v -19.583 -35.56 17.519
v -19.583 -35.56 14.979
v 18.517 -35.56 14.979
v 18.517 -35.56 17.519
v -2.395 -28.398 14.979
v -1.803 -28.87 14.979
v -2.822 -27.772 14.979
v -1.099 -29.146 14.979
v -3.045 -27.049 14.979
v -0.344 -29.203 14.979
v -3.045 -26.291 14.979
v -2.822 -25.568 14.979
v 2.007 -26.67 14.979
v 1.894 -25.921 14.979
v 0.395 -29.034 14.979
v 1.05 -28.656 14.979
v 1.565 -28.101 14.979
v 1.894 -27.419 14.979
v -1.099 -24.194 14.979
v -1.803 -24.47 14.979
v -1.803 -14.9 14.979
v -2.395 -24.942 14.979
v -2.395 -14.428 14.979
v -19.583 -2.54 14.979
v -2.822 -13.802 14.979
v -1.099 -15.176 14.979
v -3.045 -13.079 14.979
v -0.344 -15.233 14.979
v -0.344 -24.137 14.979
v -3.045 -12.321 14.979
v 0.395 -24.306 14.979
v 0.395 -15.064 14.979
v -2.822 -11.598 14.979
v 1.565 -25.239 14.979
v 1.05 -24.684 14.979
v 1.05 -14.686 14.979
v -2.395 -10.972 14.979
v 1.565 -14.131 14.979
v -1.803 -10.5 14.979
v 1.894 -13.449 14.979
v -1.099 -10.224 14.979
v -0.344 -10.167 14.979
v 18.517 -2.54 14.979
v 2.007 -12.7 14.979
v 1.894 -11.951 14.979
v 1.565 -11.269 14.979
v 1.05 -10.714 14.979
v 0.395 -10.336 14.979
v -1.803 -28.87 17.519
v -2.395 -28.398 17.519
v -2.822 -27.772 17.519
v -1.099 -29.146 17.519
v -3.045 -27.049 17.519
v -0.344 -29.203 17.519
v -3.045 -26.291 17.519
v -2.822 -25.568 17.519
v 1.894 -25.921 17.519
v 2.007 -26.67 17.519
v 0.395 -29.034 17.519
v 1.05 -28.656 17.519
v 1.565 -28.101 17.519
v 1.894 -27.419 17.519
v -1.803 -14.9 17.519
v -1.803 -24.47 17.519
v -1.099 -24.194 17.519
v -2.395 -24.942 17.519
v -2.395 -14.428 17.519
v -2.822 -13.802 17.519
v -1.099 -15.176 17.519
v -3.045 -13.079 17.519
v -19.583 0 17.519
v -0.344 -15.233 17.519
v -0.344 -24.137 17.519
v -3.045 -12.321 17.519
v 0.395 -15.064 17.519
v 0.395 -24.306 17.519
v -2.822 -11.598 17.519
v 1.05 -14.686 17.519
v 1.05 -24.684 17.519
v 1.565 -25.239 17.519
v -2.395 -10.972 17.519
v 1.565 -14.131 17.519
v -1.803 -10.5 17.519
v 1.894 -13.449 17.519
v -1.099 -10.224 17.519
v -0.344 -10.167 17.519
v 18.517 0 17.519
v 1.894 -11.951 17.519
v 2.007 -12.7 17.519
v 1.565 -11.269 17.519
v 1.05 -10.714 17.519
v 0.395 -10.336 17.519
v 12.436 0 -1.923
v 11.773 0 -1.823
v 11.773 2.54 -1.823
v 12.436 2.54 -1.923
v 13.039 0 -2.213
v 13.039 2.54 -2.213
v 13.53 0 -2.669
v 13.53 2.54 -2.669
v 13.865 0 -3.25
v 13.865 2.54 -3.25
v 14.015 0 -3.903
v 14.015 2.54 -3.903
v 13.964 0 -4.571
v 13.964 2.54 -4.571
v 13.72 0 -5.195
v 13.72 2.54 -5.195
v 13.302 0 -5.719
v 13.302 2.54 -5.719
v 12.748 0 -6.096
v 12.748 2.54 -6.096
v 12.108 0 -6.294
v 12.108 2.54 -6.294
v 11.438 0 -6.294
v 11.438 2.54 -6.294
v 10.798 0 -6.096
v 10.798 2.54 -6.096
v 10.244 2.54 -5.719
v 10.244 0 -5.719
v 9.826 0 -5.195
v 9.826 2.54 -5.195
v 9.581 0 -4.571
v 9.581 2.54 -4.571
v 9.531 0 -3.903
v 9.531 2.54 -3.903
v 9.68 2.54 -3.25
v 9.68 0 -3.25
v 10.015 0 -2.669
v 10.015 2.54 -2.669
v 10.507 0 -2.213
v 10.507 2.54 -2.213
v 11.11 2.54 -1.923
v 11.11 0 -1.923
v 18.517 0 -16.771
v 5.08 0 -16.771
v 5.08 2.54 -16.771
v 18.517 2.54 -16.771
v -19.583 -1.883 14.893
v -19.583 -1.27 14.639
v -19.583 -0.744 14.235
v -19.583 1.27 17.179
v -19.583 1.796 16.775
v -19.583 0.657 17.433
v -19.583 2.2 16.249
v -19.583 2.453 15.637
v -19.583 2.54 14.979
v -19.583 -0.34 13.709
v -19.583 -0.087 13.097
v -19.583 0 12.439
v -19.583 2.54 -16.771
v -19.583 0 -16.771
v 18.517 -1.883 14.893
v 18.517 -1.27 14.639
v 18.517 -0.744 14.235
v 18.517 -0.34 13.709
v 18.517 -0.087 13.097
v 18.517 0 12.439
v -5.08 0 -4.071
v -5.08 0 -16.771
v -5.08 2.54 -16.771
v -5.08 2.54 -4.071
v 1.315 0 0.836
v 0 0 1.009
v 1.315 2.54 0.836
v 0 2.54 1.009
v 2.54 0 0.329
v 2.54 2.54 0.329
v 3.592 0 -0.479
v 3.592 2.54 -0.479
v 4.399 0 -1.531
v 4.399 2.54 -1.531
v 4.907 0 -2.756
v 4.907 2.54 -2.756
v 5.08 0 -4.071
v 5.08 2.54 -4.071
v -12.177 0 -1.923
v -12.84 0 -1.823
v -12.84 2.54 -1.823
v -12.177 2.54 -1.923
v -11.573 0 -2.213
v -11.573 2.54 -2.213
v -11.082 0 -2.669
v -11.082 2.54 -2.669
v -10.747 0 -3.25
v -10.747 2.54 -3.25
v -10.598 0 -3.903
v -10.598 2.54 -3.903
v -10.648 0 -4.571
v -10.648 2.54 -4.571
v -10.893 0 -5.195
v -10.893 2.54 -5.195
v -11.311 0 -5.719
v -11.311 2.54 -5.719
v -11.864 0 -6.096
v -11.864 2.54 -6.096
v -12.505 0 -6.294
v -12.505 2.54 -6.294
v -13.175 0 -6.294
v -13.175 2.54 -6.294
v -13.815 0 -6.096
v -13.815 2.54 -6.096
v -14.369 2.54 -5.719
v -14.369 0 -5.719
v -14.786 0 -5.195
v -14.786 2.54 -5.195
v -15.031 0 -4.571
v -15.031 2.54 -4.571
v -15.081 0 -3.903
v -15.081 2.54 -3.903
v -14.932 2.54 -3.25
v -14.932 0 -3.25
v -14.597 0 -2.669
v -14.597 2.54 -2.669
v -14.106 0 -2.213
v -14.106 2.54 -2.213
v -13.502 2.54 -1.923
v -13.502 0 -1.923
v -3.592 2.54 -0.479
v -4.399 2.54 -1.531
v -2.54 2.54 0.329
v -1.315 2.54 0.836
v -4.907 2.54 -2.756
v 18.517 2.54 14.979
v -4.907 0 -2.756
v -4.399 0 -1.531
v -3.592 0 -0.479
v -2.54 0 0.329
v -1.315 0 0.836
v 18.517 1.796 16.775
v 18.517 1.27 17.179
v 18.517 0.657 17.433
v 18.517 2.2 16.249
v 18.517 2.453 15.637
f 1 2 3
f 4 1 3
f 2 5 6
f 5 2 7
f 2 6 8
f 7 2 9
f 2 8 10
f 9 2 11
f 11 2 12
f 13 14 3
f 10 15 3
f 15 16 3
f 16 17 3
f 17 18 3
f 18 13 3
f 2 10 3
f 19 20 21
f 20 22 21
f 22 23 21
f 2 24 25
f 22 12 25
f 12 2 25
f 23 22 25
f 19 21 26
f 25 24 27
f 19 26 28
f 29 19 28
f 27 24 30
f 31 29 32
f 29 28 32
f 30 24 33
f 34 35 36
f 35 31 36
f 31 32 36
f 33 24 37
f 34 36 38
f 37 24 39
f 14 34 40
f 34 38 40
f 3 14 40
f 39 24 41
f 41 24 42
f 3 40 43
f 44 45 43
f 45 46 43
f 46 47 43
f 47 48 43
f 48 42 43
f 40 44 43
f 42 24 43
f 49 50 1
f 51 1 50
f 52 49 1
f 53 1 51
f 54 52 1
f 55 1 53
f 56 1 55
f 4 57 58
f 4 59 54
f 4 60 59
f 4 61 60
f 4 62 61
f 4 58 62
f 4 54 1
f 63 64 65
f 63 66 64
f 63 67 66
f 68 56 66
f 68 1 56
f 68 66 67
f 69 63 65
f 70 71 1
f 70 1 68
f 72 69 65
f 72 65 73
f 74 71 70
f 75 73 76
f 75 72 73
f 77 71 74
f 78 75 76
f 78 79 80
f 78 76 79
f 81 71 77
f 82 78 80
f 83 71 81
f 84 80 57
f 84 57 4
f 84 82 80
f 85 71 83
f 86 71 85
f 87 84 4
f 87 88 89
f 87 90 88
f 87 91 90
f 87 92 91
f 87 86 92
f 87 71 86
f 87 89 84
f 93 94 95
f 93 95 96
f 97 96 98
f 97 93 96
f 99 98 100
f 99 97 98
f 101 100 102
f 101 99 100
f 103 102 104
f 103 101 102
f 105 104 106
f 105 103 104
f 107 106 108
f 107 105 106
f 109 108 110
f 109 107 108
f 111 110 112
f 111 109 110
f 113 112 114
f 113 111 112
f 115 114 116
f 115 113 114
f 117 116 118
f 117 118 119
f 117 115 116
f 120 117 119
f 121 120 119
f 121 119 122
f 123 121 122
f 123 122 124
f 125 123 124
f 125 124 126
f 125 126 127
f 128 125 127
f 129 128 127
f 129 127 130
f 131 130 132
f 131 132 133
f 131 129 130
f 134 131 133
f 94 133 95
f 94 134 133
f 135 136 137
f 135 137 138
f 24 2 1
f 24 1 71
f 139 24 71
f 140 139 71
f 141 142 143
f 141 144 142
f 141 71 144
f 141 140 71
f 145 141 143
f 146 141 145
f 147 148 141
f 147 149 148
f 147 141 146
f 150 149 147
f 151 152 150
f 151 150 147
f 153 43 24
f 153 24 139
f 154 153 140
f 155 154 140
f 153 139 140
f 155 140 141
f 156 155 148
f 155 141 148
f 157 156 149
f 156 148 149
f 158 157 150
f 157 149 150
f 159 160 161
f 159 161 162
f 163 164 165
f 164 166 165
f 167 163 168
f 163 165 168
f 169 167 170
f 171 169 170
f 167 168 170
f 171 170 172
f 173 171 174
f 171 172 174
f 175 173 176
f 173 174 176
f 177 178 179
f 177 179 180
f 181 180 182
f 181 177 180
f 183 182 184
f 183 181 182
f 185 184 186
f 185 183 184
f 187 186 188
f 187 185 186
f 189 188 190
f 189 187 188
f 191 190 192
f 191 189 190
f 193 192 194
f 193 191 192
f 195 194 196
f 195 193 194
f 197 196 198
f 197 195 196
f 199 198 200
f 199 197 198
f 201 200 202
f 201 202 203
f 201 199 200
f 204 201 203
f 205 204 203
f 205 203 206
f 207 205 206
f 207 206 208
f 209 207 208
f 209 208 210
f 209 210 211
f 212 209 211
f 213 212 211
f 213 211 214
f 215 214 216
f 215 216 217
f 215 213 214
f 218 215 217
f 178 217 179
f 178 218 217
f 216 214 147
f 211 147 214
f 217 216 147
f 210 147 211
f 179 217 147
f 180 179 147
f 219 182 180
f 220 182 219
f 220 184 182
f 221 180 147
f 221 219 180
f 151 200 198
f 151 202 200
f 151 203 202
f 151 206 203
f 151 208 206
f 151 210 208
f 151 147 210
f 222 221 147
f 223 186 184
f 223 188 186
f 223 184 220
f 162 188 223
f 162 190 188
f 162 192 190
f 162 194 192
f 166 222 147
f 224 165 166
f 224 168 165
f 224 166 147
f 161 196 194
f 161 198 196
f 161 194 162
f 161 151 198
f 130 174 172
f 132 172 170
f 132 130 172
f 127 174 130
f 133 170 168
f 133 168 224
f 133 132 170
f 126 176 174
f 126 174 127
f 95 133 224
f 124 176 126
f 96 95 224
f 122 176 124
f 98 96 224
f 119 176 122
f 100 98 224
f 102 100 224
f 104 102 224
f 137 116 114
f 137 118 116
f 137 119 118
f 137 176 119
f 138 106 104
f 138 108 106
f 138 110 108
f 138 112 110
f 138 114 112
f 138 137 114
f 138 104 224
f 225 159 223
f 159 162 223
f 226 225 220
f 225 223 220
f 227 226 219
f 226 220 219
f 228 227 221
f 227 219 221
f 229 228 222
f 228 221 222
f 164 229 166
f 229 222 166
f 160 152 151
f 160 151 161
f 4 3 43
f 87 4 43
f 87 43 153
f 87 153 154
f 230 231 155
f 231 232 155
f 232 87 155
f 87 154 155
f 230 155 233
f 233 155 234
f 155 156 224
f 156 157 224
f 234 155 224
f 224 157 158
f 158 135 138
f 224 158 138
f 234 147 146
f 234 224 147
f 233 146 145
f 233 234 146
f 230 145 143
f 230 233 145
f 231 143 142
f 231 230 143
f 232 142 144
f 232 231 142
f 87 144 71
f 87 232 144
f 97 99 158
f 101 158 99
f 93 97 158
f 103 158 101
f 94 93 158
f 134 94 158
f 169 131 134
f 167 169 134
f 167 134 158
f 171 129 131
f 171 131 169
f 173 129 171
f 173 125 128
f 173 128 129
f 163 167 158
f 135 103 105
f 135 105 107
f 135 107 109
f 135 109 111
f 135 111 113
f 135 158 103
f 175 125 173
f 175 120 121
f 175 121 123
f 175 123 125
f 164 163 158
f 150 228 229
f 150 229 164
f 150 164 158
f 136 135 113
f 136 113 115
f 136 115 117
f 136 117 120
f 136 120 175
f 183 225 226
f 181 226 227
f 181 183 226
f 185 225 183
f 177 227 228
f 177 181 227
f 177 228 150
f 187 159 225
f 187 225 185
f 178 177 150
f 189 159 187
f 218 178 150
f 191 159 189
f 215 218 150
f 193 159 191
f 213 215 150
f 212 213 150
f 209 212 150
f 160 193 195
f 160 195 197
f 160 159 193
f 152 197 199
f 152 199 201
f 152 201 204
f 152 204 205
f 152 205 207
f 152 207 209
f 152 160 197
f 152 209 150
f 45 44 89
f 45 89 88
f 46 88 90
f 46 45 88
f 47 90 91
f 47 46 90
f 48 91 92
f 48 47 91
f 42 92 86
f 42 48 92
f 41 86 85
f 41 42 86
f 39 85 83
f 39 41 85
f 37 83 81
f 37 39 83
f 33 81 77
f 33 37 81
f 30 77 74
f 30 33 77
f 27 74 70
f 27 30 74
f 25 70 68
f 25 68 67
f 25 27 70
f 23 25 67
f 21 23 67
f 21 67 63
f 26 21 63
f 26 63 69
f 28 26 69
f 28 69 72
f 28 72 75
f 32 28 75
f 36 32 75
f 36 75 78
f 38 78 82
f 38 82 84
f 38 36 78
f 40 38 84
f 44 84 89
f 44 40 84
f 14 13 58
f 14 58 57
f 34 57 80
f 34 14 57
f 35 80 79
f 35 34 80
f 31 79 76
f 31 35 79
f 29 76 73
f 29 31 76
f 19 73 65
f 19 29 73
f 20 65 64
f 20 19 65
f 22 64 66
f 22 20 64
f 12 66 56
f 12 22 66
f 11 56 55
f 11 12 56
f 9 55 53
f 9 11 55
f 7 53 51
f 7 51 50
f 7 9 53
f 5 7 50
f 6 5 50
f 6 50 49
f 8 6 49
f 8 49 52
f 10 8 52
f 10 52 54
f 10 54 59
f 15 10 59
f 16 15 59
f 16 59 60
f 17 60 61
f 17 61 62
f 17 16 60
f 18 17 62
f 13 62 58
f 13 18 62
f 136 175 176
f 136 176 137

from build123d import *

# Parameters (mm, degrees)
SKETCH1_R           = 2.2479
BOSS_EXTRUDE1_DEPTH = 2.54
FILLET1_R           = 5.08
SKETCH2_W           = 38.1
SKETCH2_H           = 38.1
SKETCH2_R           = 2.54
BOSS_EXTRUDE2_DEPTH = 2.54
FILLET2_R           = 2.54
FILLET3_R           = 2.54


with BuildPart() as part:
    # Sketch1 → Boss-Extrude1 (new body)
    with BuildSketch(Plane(origin=(0, 0, 0), x_dir=(1, 0, 0), z_dir=(0, 1, 0))):
        Polygon((-19.583364039, 16.770768135), (-5.08, 16.770768135), (-5.08, -1.009231865), (5.08, -1.009231865), (5.08, 16.770768135), (18.516635961, 16.770768135), (18.516635961, -14.979231865), (-19.583364039, -14.979231865), align=None)
        with Locations(Location((-12.839664039, 4.070768135, 0), (0, 0, 270))):
            Circle(SKETCH1_R, mode=Mode.SUBTRACT)
        with Locations(Location((11.772935961, 4.070768135, 0), (0, 0, 270))):
            Circle(SKETCH1_R, mode=Mode.SUBTRACT)
    extrude(amount=BOSS_EXTRUDE1_DEPTH)

    # Fillet1
    fillet1_edges = [part.edges().sort_by_distance(p)[0] for p in [
        (5.08, 1.27, 1.009231865),
        (-5.08, 1.27, 1.009231865),
    ]]
    fillet(fillet1_edges, radius=FILLET1_R - 0.0001)  # a hair under: the kernel refuses the full size

    # Sketch2 → Boss-Extrude2 (add)
    with BuildSketch(Plane.XY.offset(14.979231865)):
        with Locations((-0.533364039, -16.51)):
            Rectangle(SKETCH2_W, SKETCH2_H)
        with Locations((-0.533364039, -12.7)):
            Circle(SKETCH2_R, mode=Mode.SUBTRACT)
        with Locations((-0.533364039, -26.67)):
            Circle(SKETCH2_R, mode=Mode.SUBTRACT)
    extrude(amount=BOSS_EXTRUDE2_DEPTH)

    # Fillet2
    fillet2_edges = [part.edges().sort_by_distance(p)[0] for p in [
        (-0.533364039, 0, 14.979231865),
    ]]
    fillet(fillet2_edges, radius=FILLET2_R)

    # Fillet3
    fillet3_edges = [part.edges().sort_by_distance(p)[0] for p in [
        (-0.533364039, 2.54, 17.519231865),
    ]]
    fillet(fillet3_edges, radius=FILLET3_R)


solid = part.part
